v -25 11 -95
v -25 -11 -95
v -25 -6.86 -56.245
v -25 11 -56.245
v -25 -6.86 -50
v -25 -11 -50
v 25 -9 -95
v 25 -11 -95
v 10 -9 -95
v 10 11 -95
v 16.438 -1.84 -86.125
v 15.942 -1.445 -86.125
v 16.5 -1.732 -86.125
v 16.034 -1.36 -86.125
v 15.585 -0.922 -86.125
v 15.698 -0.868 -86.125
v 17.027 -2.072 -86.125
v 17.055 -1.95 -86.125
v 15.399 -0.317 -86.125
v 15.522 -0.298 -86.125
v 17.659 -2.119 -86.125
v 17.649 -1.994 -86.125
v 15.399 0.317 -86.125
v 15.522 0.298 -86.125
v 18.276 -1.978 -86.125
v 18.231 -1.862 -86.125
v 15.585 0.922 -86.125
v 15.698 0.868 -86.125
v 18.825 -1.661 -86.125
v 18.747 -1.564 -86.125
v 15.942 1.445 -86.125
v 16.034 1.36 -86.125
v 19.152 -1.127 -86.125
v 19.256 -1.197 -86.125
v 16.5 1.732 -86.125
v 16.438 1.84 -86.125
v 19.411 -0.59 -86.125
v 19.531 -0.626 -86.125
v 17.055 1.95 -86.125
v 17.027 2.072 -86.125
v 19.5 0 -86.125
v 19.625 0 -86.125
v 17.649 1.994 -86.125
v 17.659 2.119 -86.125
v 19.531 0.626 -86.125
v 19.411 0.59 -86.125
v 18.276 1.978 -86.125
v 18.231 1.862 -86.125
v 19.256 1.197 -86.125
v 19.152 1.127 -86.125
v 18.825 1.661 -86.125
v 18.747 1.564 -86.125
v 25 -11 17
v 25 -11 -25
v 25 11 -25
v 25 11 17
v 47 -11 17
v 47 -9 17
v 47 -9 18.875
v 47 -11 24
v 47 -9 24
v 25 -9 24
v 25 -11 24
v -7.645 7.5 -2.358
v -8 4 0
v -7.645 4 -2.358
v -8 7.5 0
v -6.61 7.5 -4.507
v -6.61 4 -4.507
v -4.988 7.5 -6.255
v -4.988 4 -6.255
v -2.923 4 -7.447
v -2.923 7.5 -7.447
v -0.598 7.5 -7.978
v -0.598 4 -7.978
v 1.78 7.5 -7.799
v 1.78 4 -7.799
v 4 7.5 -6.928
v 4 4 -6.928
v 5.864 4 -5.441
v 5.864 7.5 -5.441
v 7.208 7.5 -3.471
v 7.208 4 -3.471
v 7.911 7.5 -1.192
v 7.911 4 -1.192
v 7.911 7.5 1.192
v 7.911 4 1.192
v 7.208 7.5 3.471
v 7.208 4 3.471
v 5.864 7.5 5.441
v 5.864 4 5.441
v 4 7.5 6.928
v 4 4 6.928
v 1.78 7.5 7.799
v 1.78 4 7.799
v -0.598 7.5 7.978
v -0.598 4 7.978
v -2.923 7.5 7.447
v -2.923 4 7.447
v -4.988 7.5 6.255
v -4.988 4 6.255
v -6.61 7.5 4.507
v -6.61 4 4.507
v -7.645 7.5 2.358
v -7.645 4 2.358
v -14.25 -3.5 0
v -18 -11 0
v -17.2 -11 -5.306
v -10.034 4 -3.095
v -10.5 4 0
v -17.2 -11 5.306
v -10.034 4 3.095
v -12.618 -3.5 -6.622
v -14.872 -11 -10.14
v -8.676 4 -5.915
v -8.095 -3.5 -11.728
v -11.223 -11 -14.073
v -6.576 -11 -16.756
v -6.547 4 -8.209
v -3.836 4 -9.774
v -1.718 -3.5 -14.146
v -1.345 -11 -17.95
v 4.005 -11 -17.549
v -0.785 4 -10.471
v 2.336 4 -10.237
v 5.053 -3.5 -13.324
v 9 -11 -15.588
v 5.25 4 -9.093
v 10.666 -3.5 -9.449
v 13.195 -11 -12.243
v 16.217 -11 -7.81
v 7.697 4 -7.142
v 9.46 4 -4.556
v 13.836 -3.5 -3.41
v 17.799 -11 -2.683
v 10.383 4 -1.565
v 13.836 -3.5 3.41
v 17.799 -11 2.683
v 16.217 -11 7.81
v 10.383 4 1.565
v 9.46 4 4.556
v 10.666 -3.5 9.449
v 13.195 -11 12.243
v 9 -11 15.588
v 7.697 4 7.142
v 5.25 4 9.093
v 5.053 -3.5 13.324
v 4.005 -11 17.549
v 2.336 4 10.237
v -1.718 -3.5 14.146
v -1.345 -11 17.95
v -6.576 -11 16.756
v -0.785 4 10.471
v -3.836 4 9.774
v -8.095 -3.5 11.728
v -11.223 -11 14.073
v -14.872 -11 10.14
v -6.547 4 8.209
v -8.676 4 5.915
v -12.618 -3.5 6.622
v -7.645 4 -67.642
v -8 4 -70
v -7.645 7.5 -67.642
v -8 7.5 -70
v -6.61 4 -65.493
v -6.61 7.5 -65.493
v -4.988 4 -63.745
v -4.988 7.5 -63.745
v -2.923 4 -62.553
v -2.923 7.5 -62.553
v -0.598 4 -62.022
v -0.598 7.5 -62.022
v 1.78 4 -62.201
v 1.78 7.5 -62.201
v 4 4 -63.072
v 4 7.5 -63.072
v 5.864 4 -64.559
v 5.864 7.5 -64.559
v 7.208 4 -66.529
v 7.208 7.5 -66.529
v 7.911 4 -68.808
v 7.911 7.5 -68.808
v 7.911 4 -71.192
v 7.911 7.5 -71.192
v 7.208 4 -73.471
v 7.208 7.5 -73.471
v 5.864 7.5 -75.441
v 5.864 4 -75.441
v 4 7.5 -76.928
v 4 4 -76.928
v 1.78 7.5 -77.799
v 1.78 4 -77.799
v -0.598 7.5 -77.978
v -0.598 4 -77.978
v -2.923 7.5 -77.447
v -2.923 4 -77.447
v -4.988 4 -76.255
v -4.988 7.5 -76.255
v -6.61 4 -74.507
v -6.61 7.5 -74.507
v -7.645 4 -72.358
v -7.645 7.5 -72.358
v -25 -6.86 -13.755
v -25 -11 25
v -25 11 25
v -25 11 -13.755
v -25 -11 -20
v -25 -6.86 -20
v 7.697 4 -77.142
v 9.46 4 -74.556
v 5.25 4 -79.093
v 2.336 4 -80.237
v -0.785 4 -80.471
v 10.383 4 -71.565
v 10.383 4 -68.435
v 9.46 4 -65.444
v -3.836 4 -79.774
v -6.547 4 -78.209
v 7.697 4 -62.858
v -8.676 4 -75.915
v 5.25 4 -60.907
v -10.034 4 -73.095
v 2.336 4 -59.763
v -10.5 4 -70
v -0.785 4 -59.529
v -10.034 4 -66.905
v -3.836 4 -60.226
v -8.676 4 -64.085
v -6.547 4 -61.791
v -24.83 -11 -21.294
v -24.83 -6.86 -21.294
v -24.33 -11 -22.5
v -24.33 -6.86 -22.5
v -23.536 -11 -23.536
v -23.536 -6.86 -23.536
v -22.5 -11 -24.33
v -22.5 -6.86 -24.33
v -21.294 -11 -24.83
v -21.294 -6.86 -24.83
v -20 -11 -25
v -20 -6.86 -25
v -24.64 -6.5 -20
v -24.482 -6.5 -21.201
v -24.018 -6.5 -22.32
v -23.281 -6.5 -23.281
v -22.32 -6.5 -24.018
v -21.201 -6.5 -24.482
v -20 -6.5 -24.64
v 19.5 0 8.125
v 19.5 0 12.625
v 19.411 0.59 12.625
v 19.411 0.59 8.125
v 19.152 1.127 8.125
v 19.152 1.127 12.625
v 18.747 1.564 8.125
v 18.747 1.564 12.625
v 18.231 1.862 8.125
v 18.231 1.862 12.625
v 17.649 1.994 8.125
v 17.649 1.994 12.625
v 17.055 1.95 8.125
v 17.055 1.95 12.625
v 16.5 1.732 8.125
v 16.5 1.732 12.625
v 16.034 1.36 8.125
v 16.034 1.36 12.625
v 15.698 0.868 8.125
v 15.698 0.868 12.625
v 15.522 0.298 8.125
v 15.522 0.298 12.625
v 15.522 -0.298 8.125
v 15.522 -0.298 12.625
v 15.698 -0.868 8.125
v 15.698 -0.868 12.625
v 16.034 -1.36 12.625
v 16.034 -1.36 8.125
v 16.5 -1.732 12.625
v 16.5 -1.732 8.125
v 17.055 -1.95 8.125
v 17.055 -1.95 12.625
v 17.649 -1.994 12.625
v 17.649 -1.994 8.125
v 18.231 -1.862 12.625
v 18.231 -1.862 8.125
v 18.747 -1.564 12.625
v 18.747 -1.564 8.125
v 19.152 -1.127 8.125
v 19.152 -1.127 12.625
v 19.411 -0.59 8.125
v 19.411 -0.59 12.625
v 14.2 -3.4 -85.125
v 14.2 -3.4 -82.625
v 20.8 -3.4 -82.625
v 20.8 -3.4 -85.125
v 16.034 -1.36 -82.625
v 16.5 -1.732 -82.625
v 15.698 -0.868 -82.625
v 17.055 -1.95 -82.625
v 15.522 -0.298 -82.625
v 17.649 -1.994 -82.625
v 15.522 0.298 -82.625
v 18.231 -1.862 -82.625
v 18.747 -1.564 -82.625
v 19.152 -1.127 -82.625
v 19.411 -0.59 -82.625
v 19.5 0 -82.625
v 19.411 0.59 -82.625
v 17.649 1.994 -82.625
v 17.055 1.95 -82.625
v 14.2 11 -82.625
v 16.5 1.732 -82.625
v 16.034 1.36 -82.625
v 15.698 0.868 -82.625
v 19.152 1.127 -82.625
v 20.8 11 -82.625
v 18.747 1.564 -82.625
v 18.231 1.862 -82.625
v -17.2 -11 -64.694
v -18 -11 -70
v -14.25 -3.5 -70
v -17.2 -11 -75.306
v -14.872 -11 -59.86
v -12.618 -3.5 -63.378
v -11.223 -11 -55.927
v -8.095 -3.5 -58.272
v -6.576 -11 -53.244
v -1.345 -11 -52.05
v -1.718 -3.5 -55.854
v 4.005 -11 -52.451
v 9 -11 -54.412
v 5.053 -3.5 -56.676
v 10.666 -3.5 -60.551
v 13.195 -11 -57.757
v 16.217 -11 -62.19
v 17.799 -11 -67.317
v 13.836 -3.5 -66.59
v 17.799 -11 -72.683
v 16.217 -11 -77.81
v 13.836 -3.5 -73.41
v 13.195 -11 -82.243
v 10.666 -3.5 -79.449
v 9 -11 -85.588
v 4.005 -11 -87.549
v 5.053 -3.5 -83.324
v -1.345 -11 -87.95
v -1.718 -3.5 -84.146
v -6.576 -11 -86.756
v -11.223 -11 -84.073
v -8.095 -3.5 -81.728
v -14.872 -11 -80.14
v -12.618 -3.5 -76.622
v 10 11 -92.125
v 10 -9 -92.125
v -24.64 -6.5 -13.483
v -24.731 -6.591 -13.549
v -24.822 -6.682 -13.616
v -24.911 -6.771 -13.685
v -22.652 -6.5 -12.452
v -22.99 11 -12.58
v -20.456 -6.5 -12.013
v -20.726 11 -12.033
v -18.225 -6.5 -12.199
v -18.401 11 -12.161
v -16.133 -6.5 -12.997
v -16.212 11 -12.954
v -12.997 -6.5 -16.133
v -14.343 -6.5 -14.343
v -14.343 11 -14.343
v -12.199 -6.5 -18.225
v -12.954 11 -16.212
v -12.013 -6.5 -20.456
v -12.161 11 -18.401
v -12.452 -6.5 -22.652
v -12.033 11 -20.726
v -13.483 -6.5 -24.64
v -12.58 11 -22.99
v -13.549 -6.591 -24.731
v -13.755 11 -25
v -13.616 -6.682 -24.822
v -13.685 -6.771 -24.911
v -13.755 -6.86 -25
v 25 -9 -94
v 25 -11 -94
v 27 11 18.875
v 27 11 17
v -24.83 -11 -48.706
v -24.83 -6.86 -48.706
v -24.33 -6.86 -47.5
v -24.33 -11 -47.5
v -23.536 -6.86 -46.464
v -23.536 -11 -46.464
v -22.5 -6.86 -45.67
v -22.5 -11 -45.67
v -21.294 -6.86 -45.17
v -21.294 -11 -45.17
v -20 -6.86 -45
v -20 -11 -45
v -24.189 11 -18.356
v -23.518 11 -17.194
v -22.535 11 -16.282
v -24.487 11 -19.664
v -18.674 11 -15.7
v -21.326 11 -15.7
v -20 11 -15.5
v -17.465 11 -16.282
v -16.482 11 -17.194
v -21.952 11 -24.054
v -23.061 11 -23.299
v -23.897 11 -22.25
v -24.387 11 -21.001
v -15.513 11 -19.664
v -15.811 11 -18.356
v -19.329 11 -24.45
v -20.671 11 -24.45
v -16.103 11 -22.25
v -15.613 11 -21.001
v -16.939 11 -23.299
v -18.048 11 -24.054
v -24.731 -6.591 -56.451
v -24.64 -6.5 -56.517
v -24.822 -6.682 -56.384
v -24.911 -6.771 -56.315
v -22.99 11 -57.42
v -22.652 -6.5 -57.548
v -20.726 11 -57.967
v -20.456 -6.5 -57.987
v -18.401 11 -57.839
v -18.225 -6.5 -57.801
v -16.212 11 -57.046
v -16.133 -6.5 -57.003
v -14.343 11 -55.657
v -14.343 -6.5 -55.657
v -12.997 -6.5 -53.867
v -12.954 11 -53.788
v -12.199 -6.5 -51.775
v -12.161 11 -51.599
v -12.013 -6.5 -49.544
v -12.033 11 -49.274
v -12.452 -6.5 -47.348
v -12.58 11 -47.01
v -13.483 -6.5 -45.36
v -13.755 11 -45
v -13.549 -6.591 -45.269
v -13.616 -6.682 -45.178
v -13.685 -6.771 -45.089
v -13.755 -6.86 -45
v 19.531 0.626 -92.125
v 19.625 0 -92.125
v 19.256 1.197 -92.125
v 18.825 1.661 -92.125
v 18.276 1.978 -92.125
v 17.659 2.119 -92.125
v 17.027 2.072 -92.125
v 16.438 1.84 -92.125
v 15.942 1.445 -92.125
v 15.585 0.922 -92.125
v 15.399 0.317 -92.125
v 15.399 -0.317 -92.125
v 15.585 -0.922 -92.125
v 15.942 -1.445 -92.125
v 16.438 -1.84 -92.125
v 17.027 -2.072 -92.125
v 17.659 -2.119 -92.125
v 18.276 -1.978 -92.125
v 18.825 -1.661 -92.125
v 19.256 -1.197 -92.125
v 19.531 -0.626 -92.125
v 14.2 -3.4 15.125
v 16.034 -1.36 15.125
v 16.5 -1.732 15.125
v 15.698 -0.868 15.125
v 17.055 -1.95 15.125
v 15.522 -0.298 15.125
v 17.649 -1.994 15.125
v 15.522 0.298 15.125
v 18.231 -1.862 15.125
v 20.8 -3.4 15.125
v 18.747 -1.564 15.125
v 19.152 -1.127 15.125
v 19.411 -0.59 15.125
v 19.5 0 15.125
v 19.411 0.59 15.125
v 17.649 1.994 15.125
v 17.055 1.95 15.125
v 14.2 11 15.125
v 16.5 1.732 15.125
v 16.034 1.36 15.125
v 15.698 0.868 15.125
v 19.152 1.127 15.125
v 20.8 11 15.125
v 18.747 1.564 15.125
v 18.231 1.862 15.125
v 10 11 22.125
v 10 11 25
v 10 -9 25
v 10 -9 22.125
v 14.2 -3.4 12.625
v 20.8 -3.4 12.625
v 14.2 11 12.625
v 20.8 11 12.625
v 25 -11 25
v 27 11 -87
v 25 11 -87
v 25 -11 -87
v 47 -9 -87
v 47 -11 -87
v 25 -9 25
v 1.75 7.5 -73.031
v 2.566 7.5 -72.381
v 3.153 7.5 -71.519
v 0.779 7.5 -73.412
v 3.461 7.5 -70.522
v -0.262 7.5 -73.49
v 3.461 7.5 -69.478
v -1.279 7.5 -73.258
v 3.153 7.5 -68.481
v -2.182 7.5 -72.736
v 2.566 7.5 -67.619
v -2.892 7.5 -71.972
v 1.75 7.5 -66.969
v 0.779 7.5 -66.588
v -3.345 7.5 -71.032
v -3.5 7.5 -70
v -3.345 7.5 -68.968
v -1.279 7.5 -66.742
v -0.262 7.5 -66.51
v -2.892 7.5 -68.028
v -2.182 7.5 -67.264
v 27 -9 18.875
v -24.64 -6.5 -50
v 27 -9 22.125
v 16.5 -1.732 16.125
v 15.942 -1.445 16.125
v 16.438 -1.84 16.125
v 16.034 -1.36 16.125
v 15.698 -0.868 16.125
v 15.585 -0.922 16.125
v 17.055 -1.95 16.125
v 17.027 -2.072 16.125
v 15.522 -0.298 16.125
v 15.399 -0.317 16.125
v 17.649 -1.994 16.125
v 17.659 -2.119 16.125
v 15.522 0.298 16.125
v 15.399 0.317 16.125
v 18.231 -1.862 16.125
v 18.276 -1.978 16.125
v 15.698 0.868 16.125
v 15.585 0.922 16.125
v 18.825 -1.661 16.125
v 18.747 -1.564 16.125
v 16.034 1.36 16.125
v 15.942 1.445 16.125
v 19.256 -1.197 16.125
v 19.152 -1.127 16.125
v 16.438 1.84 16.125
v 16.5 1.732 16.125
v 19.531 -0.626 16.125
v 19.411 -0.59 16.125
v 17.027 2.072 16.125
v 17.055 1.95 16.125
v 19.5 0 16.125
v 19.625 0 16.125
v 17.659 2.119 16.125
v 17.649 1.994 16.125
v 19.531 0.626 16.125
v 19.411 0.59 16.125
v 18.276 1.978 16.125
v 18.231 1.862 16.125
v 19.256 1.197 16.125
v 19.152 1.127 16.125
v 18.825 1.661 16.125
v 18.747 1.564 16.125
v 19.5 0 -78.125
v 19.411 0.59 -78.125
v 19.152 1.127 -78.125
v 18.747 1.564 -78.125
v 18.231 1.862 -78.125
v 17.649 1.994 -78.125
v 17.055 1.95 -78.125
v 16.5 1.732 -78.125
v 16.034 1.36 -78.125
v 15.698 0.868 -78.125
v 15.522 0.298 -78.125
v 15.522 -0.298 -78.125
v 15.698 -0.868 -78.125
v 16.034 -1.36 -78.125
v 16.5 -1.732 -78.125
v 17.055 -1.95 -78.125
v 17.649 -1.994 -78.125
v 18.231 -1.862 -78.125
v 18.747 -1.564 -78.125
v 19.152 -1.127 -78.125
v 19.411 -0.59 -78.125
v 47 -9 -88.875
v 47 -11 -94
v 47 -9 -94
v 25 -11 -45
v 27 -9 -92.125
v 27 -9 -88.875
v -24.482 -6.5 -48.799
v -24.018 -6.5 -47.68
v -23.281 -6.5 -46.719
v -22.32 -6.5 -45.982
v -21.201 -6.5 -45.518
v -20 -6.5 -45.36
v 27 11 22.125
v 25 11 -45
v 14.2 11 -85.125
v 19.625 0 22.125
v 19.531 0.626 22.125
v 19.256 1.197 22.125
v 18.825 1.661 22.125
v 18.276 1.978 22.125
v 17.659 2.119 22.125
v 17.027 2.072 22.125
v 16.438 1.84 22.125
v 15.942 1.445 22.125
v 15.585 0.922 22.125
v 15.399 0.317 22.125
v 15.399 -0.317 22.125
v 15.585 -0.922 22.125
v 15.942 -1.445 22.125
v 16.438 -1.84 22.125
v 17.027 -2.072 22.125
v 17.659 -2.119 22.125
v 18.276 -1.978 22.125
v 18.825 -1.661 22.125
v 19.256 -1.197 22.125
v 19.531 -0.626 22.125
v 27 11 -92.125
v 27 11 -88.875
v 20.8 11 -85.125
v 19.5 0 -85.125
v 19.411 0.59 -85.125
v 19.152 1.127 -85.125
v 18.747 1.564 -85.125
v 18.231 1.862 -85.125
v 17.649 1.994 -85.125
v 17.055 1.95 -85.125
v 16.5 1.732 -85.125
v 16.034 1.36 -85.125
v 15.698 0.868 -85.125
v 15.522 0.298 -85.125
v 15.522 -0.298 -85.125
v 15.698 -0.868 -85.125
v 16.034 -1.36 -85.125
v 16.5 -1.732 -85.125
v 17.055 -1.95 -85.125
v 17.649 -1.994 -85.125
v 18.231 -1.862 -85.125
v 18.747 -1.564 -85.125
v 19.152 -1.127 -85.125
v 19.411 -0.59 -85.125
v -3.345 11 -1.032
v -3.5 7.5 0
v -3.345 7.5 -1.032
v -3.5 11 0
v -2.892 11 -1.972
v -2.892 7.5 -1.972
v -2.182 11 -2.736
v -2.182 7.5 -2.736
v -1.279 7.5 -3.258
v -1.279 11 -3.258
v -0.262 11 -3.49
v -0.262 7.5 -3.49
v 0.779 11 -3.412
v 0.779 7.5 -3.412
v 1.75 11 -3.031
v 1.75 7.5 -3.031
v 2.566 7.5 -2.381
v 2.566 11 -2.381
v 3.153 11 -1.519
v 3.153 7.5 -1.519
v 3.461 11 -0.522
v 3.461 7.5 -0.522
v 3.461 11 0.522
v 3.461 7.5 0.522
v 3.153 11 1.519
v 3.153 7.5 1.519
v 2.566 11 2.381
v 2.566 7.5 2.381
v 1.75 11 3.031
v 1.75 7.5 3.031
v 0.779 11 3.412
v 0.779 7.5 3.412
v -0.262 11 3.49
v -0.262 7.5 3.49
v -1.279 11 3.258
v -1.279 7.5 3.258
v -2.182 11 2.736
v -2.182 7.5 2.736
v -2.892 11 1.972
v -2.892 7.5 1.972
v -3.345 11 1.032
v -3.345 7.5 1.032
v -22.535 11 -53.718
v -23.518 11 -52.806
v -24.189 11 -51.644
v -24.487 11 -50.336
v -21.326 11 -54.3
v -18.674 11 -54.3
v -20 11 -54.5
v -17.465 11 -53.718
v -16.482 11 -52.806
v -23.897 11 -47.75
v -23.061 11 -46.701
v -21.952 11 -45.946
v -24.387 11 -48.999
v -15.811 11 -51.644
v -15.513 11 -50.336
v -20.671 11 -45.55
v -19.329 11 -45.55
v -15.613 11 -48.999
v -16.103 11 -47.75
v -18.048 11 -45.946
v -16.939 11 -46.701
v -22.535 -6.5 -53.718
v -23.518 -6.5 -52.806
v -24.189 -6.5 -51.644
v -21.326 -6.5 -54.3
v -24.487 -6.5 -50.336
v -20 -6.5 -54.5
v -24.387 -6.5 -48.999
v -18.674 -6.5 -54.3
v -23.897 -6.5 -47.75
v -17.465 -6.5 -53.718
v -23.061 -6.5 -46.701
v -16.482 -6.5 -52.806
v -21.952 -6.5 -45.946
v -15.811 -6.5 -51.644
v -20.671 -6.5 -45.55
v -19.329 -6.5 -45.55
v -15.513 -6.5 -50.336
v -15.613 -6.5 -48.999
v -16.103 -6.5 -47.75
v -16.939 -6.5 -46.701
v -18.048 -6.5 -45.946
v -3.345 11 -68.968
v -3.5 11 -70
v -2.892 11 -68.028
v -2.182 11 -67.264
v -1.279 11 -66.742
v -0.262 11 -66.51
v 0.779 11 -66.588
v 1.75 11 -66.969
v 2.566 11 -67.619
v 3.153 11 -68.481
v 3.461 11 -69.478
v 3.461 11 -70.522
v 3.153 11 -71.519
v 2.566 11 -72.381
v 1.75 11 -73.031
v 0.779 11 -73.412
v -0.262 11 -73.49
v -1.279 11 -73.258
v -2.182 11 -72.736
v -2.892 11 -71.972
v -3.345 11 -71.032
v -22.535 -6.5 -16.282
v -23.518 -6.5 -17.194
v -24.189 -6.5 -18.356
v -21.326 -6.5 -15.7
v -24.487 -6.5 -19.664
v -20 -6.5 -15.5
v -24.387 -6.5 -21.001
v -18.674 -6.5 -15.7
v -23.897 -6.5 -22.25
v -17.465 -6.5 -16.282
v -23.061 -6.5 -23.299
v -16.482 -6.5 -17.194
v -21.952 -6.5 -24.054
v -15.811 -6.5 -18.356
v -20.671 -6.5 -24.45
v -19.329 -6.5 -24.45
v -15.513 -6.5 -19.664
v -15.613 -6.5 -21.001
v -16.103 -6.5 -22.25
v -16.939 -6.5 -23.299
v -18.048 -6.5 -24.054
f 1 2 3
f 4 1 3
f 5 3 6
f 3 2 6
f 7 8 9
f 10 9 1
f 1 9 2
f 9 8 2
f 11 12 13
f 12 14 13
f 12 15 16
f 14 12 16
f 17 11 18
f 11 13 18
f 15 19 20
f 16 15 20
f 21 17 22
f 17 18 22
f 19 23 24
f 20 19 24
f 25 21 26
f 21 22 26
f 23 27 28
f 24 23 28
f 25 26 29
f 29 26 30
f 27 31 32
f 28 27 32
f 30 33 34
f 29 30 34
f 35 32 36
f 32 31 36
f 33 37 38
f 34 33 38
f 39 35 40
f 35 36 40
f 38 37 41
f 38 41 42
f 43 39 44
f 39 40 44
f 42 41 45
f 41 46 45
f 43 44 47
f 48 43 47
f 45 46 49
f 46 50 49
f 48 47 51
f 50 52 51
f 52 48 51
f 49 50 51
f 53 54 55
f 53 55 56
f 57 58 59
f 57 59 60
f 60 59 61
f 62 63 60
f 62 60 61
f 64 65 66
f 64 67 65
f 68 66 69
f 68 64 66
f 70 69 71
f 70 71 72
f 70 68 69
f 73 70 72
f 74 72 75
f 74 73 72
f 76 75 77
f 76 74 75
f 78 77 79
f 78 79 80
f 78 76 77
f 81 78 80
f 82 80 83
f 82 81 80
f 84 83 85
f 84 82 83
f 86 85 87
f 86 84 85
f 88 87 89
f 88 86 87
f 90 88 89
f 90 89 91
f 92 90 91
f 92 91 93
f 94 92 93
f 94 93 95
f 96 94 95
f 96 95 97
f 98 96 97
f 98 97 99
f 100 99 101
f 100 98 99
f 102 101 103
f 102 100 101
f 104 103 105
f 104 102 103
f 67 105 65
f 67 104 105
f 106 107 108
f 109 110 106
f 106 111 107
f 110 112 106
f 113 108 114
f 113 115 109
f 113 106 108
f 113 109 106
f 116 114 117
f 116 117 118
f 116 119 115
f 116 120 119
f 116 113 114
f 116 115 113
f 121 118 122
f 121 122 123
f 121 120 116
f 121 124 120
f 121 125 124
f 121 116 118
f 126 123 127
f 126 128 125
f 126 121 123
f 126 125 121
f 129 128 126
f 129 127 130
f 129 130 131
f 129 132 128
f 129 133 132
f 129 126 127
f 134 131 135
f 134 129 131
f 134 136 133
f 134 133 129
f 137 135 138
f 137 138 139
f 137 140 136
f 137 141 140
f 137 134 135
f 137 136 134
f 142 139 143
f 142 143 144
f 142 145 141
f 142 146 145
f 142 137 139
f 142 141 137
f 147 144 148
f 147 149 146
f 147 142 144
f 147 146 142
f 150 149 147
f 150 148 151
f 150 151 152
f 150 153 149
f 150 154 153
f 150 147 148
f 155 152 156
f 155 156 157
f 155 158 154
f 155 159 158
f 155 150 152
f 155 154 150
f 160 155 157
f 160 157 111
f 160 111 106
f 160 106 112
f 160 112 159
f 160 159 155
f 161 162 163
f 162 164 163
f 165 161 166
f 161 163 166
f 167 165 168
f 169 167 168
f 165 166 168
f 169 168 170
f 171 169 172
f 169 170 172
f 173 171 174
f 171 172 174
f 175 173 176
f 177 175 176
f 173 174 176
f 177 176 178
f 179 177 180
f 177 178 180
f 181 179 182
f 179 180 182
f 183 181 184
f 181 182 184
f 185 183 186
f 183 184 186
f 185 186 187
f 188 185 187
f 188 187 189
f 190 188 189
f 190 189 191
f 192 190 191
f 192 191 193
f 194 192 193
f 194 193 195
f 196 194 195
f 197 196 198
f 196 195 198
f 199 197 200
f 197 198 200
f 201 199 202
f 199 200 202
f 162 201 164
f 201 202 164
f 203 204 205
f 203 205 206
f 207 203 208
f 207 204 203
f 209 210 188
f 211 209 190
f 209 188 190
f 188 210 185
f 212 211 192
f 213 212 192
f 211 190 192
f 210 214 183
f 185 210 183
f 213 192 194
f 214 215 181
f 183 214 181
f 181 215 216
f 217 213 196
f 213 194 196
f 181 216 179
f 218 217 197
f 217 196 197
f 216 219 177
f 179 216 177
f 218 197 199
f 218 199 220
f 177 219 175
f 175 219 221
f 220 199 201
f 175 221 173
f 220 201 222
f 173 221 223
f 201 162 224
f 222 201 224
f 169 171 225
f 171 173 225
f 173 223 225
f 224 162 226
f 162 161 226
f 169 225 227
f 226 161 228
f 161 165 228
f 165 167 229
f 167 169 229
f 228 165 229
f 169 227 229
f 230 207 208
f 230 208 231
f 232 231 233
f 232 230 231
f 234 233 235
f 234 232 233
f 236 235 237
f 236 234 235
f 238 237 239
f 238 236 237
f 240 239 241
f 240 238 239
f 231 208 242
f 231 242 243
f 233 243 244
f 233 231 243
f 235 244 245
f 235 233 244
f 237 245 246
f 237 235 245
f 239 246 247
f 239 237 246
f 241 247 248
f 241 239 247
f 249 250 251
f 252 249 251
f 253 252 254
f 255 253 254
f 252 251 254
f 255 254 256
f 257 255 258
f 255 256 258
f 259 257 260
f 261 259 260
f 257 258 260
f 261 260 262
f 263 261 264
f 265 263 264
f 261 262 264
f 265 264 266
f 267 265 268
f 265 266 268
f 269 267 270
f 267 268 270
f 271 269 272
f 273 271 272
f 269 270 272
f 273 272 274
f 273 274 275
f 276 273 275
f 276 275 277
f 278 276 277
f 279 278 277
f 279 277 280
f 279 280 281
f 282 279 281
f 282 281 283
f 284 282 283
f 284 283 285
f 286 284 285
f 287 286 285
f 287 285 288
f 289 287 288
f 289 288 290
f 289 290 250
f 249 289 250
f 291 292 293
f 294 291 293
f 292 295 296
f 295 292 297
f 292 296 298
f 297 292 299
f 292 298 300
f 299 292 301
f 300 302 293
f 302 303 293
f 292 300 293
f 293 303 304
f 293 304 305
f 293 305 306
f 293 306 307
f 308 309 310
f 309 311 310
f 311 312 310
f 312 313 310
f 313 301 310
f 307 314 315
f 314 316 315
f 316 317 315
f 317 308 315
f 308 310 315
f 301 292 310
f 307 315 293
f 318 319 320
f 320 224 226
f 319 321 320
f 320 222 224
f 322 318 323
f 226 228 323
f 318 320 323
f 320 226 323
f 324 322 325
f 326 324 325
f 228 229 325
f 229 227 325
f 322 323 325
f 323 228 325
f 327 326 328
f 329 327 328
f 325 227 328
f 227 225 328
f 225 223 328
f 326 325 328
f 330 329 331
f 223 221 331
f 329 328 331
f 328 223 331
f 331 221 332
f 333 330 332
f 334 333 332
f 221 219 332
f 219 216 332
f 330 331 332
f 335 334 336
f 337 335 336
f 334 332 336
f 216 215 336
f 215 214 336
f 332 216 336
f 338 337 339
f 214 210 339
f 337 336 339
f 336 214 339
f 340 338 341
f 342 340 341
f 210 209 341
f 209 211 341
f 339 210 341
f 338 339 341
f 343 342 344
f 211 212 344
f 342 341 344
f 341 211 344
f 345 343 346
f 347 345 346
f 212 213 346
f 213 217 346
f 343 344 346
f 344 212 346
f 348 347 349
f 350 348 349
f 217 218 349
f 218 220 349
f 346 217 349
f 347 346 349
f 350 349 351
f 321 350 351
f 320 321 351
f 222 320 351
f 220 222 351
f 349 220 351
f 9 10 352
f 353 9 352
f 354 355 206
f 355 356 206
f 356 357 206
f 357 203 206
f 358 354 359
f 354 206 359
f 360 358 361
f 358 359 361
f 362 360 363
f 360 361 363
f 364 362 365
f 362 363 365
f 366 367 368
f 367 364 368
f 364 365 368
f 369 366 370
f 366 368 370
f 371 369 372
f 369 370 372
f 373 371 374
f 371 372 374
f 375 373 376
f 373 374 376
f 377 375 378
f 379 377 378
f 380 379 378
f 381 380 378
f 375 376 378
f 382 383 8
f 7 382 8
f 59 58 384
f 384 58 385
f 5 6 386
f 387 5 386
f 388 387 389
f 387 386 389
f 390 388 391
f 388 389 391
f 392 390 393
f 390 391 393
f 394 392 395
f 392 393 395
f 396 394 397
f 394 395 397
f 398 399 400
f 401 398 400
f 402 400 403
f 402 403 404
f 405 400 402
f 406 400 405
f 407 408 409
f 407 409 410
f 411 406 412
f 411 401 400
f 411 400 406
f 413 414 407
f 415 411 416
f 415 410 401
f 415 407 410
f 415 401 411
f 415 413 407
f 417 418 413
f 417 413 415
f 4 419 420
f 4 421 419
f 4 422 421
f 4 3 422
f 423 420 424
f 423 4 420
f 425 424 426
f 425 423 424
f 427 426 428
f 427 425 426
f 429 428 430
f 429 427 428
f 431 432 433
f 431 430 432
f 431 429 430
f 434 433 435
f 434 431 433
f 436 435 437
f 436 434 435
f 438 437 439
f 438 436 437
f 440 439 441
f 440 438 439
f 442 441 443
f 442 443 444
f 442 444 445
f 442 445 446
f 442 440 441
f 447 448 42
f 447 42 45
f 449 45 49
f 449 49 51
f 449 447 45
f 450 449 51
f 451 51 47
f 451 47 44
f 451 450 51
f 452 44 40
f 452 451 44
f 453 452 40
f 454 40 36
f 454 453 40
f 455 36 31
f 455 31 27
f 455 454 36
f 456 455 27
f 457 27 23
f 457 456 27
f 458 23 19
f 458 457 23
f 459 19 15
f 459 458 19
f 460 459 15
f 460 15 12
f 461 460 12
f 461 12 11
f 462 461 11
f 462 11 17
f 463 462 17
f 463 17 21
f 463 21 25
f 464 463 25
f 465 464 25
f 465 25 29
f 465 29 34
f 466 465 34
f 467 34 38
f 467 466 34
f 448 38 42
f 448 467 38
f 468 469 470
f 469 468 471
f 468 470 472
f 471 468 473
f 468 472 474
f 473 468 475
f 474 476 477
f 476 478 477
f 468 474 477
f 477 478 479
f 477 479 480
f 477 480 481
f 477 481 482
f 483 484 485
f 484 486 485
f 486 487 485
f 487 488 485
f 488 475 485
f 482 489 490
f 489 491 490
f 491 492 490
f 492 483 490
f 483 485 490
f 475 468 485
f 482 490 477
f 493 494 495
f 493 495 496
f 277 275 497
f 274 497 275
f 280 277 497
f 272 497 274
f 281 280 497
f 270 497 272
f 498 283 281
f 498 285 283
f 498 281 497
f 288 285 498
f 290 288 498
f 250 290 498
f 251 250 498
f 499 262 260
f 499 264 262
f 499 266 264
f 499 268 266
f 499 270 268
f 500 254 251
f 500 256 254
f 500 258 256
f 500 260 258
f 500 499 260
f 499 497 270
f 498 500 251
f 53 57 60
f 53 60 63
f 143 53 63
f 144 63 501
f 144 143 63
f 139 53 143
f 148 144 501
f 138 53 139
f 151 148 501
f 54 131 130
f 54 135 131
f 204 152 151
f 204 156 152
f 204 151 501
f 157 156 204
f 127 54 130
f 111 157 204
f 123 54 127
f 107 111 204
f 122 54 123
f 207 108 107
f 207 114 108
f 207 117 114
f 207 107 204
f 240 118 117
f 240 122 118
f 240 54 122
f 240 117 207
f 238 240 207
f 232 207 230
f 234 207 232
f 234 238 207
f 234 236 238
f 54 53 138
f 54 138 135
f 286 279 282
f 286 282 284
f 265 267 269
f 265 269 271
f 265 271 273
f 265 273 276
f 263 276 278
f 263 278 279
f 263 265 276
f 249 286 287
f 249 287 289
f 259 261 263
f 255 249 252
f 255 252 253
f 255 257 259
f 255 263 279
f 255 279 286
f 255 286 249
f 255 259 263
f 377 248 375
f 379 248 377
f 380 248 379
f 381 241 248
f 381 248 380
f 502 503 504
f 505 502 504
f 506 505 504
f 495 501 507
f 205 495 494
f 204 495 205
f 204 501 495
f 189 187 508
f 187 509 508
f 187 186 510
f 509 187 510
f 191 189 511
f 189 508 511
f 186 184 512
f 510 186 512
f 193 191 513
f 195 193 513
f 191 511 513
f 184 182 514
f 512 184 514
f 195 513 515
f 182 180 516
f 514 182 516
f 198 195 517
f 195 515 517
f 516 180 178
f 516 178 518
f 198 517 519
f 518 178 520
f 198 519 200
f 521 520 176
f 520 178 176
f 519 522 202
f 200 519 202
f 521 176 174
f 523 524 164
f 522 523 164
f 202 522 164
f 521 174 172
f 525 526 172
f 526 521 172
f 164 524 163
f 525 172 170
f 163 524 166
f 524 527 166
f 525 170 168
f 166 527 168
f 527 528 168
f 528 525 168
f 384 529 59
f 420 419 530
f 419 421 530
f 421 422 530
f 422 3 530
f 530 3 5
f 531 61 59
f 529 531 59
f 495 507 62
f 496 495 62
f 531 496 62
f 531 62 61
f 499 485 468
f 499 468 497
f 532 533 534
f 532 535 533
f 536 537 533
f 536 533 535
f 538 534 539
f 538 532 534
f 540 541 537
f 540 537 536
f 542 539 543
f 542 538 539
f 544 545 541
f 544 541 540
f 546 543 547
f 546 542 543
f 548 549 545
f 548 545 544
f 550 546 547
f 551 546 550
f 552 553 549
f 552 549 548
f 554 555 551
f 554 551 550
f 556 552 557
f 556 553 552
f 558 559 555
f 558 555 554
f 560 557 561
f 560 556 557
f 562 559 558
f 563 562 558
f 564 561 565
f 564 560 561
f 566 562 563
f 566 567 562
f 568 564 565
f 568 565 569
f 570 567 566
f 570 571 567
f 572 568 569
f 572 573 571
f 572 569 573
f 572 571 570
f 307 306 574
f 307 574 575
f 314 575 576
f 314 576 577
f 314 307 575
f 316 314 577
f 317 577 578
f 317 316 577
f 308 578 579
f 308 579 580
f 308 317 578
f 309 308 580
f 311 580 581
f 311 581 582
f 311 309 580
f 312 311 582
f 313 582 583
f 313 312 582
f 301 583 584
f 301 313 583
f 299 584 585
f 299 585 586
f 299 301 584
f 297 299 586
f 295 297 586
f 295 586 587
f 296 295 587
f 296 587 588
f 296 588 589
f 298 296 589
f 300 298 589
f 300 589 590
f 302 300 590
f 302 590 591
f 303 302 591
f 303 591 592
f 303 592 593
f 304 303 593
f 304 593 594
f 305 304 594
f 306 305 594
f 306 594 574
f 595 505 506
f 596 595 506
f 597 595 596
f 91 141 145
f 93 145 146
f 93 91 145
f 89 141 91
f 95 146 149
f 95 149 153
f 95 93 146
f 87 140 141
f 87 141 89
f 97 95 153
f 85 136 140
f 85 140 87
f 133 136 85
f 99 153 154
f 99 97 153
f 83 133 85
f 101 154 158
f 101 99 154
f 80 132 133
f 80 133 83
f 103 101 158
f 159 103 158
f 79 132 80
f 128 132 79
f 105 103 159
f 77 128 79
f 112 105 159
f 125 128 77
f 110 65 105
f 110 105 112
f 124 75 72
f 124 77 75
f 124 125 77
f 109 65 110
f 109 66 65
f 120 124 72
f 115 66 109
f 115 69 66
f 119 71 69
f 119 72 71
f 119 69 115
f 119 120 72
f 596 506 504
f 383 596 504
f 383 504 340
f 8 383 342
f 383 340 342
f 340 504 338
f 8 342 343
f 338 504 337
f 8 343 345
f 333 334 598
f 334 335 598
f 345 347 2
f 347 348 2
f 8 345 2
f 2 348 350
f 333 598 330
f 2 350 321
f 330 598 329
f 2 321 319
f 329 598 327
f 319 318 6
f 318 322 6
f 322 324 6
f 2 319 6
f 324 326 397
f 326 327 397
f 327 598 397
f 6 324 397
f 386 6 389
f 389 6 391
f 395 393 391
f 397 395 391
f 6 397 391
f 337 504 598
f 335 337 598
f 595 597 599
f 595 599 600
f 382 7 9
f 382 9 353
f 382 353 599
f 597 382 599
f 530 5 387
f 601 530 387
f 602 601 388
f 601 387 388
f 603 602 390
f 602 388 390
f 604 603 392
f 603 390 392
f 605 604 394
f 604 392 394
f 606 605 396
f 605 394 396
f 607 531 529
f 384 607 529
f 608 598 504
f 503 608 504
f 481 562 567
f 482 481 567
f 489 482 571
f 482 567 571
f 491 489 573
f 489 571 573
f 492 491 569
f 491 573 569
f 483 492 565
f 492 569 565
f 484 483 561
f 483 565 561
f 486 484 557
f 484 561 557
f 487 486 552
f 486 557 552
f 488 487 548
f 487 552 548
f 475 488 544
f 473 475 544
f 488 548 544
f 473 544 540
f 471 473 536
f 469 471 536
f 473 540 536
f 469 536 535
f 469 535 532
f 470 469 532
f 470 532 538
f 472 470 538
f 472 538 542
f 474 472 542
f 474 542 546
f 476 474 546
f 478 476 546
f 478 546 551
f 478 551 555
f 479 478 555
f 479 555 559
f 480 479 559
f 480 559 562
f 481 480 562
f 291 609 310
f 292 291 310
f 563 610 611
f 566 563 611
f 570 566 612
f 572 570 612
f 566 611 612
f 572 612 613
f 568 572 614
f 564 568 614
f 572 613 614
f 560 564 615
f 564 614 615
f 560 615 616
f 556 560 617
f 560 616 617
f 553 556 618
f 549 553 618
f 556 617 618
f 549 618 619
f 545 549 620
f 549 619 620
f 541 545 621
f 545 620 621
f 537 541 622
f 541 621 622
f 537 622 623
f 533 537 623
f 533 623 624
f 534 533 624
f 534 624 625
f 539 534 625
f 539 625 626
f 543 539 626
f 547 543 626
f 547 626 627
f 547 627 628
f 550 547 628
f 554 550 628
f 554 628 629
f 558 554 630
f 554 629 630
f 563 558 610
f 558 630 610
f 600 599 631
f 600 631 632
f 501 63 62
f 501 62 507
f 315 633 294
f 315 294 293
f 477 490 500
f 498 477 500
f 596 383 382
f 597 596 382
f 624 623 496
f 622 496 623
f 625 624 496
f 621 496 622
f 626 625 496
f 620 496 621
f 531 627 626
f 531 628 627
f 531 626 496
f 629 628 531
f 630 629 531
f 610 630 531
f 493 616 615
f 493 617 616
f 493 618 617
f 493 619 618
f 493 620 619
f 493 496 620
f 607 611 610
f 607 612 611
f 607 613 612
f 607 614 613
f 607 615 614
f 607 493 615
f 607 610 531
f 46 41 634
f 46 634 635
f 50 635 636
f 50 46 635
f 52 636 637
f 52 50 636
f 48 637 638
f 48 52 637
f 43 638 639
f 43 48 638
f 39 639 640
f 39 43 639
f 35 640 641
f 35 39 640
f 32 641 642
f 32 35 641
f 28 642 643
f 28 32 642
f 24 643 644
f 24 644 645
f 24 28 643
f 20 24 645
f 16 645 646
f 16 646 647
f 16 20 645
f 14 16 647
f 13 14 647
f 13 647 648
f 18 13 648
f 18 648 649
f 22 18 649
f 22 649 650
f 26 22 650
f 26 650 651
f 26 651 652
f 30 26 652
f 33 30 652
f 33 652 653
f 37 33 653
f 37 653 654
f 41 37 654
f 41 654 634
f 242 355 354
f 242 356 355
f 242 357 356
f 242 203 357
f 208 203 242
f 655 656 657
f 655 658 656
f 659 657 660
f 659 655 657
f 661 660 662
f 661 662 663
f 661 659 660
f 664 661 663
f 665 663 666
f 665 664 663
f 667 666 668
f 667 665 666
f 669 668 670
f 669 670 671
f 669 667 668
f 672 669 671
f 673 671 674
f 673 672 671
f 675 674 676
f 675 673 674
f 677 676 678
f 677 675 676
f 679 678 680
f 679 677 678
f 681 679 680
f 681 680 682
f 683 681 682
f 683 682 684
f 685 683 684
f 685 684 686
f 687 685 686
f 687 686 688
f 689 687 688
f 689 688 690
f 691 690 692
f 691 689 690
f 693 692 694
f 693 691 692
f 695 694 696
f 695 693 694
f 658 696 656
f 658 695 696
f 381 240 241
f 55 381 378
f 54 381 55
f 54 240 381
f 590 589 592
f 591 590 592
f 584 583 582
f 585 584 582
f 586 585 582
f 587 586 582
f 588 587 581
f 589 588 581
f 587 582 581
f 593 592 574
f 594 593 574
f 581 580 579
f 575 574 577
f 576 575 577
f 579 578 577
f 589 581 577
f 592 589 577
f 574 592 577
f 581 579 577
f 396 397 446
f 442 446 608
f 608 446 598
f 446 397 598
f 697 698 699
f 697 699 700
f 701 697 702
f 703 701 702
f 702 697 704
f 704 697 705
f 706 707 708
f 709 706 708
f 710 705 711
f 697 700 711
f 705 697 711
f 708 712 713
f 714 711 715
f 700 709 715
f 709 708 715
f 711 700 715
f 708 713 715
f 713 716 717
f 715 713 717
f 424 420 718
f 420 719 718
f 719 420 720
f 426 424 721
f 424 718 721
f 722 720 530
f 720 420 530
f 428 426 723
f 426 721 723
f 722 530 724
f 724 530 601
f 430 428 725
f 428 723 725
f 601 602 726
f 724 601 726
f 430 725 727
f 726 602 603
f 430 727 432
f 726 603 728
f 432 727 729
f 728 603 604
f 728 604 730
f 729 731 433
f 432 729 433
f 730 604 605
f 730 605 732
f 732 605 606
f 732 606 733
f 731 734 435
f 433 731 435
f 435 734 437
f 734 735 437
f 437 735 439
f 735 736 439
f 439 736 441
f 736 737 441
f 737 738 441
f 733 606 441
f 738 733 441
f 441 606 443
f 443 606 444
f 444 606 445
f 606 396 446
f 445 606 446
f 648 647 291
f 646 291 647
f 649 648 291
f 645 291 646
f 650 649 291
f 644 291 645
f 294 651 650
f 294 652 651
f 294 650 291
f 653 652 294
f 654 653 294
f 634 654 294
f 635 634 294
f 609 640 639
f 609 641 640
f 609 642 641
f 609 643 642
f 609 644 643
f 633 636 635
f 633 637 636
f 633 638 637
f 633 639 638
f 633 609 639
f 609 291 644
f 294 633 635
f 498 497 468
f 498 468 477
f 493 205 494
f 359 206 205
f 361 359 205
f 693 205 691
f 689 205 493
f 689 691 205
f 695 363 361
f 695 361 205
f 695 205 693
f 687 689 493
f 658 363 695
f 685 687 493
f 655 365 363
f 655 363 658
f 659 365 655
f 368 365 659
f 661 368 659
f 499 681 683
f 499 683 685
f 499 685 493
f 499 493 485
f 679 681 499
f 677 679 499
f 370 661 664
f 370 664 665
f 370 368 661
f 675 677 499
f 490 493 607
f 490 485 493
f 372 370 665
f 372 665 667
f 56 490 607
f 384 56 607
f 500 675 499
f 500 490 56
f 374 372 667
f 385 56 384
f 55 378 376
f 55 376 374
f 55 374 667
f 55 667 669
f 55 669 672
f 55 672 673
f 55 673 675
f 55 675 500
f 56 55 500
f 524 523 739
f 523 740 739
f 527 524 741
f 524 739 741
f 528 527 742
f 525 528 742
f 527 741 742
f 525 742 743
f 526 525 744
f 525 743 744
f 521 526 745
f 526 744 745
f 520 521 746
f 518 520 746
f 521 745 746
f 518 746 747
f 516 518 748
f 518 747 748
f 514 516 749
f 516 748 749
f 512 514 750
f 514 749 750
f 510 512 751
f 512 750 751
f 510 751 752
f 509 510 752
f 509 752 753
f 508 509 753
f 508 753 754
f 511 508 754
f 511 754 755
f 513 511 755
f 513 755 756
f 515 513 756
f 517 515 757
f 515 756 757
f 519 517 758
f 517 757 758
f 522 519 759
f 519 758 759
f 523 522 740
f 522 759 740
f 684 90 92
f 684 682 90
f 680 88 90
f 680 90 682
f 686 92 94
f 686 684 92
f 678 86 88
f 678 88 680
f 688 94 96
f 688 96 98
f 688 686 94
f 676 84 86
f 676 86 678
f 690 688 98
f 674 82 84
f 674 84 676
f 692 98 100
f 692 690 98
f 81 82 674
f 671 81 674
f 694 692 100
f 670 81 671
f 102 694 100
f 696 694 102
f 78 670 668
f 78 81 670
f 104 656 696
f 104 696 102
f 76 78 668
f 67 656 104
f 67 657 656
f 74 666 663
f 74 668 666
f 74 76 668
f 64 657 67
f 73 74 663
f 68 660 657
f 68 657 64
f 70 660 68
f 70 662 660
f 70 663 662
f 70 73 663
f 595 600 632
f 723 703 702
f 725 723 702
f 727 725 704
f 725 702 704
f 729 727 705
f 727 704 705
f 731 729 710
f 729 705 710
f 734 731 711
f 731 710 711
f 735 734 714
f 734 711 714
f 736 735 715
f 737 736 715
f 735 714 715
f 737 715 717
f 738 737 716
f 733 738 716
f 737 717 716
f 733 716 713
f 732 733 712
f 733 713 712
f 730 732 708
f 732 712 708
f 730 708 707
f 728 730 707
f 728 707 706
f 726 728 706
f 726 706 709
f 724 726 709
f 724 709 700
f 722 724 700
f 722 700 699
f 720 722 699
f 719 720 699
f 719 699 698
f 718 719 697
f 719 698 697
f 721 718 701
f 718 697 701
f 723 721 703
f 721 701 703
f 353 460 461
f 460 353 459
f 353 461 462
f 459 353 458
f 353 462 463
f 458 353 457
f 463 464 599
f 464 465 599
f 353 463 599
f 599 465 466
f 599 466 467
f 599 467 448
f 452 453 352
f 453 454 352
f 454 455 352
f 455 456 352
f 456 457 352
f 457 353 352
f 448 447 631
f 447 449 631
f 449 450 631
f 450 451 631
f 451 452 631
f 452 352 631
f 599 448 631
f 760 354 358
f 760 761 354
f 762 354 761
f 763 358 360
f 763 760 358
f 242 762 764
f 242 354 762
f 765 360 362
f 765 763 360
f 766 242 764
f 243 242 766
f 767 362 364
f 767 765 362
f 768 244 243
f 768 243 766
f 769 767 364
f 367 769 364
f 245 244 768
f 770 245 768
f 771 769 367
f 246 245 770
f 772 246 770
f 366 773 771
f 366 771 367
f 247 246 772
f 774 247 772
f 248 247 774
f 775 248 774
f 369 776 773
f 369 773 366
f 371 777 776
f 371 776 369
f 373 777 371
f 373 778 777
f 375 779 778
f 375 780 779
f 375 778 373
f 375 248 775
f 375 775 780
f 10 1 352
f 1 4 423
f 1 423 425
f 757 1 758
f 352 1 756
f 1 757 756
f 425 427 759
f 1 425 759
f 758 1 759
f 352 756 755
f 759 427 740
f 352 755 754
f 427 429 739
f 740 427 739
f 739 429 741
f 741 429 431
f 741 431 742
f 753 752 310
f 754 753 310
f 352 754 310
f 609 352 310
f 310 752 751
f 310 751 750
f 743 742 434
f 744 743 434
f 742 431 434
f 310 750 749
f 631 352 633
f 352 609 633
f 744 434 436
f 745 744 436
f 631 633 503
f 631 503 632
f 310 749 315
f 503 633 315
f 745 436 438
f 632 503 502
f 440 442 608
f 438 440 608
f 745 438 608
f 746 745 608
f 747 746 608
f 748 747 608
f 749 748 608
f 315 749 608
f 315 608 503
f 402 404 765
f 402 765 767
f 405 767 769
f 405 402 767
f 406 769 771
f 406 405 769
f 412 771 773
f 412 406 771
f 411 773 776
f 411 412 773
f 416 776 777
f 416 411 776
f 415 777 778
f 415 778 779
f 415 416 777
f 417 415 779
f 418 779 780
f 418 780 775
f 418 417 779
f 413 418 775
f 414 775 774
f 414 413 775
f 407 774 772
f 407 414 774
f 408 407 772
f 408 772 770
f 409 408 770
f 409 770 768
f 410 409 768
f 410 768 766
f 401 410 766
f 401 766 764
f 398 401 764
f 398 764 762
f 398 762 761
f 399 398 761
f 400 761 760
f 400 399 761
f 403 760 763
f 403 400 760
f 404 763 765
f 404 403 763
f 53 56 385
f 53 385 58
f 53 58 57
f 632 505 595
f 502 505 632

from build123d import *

# Parameters (mm, degrees)
BOSS_EXTRUDE1_DEPTH      = 11
BOSS_EXTRUDE1_DEPTH_BACK = 11
BOSS_EXTRUDE2_DEPTH      = 22
CUT_EXTRUDE1_DEPTH       = 7
SKETCH5_W                = 2
SKETCH5_H                = 3.25
BOSS_EXTRUDE3_DEPTH      = 20
SKETCH6_W                = 37
SKETCH6_H                = 2.875
CUT_EXTRUDE2_DEPTH       = 20
SKETCH8_R                = 2.125
CUT_EXTRUDE3_DEPTH       = 6
SKETCH9_W                = 6.6
SKETCH9_H                = 2.5
CUT_EXTRUDE4_DEPTH       = 14.4
SKETCH11_R               = 2
CUT_EXTRUDE5_DEPTH       = 8
SKETCH12_R               = 8
SKETCH12_R_2             = 4.5
CUT_EXTRUDE6_DEPTH       = 17.5
CHAMFER1_SIZE            = 0.36


with BuildPart() as part:
    # Sketch1 → Boss-Extrude1 (new, two sides: drawn at the far end of the back side and taken through both)
    with BuildSketch(Plane(origin=(0, 0, 0), x_dir=(1, 0, 0), z_dir=(0, 1, 0)).offset(-BOSS_EXTRUDE1_DEPTH_BACK)):
        with BuildLine():
            Line((-20, 25), (25, 25))
            Line((25, 25), (25, -25))
            Line((25, -25), (-25, -25))
            Line((-25, -25), (-25, 20))
            ThreePointArc((-25, 20), (-23.535533906, 23.535533906), (-20, 25))
        make_face()
    extrude(amount=BOSS_EXTRUDE1_DEPTH + BOSS_EXTRUDE1_DEPTH_BACK)

    # Sketch2 → Cut-Revolve1 (revolve, cut)
    with BuildSketch(Plane.XY):
        Polygon((-3.5, 7.5), (-3.5, 11), (0, 11), (0, -11), (-18, -11), (-10.5, 4), (-8, 4), (-8, 7.5), align=None)
    revolve(axis=Axis((0, 11, 0), (0, -1, 0)), mode=Mode.SUBTRACT)

    # Sketch3 → Boss-Extrude2 (add)
    with BuildSketch(Plane(origin=(25, 0, 0), x_dir=(0, 0, -1), z_dir=(1, 0, 0))):
        Polygon((-24, 11), (-22.125, 11), (-22.125, -9), (-18.875, -9), (-18.875, 11), (-17, 11), (-17, -11), (-24, -11), align=None)
    extrude(amount=BOSS_EXTRUDE2_DEPTH)

    # Sketch4 → Cut-Extrude1 (cut)
    with BuildSketch(Plane(origin=(0, 0, 17), x_dir=(-1, 0, 0), z_dir=(0, 0, -1))):
        Polygon((-47, -9), (-27, 11), (-47, 11), align=None)
    extrude(amount=-CUT_EXTRUDE1_DEPTH, mode=Mode.SUBTRACT)

    # Sketch5 → Boss-Extrude3 (add)
    with BuildSketch(Plane(origin=(0, -9, 0), x_dir=(1, 0, 0), z_dir=(0, 1, 0))):
        with Locations((26, -20.5)):
            Rectangle(SKETCH5_W, SKETCH5_H)
    extrude(amount=BOSS_EXTRUDE3_DEPTH)

    # Sketch6 → Cut-Extrude2 (cut)
    with BuildSketch(Plane(origin=(0, 11, 0), x_dir=(1, 0, 0), z_dir=(0, 1, 0))):
        with Locations((28.5, -23.5625)):
            Rectangle(SKETCH6_W, SKETCH6_H)
    extrude(amount=-CUT_EXTRUDE2_DEPTH, mode=Mode.SUBTRACT)

    # Sketch8 → Cut-Extrude3 (cut)
    with BuildSketch(Plane.XY.offset(22.125)):
        with Locations((17.5, 0)):
            Circle(SKETCH8_R)
    extrude(amount=-CUT_EXTRUDE3_DEPTH, mode=Mode.SUBTRACT)

    # Sketch9 → Cut-Extrude4 (cut)
    with BuildSketch(Plane(origin=(0, 11, 0), x_dir=(1, 0, 0), z_dir=(0, 1, 0))):
        with Locations((17.5, -13.875)):
            Rectangle(SKETCH9_W, SKETCH9_H)
    extrude(amount=-CUT_EXTRUDE4_DEPTH, mode=Mode.SUBTRACT)

    # Sketch11 → Cut-Extrude5 (cut)
    with BuildSketch(Plane.XY.offset(16.125)):
        with Locations((17.5, 0)):
            Circle(SKETCH11_R)
    extrude(amount=-CUT_EXTRUDE5_DEPTH, mode=Mode.SUBTRACT)

    # Sketch12 → Cut-Extrude6 (cut)
    with BuildSketch(Plane(origin=(0, 11, 0), x_dir=(1, 0, 0), z_dir=(0, 1, 0))):
        with Locations((-20, 20)):
            Circle(SKETCH12_R)
        with Locations(Location((-20, 20, 0), (0, 0, 270))):
            Circle(SKETCH12_R_2, mode=Mode.SUBTRACT)
    extrude(amount=-CUT_EXTRUDE6_DEPTH, mode=Mode.SUBTRACT)

    # Chamfer1
    chamfer1_edges = [part.edges().sort_by_distance(p)[0] for p in [
        (-16.877501001, -6.5, -25),
        (-25, -6.5, -16.877501001),
        (-23.535533906, -6.5, -23.535533906),
    ]]
    chamfer(chamfer1_edges, length=CHAMFER1_SIZE)


with BuildPart() as body_2:
    # Mirror2: mirrored copy
    add(part.part.mirror(Plane(origin=(0, 0, -35), x_dir=(1, 0, 0), z_dir=(0, 0, -1))))


solid = Compound([part.part, body_2.part])
